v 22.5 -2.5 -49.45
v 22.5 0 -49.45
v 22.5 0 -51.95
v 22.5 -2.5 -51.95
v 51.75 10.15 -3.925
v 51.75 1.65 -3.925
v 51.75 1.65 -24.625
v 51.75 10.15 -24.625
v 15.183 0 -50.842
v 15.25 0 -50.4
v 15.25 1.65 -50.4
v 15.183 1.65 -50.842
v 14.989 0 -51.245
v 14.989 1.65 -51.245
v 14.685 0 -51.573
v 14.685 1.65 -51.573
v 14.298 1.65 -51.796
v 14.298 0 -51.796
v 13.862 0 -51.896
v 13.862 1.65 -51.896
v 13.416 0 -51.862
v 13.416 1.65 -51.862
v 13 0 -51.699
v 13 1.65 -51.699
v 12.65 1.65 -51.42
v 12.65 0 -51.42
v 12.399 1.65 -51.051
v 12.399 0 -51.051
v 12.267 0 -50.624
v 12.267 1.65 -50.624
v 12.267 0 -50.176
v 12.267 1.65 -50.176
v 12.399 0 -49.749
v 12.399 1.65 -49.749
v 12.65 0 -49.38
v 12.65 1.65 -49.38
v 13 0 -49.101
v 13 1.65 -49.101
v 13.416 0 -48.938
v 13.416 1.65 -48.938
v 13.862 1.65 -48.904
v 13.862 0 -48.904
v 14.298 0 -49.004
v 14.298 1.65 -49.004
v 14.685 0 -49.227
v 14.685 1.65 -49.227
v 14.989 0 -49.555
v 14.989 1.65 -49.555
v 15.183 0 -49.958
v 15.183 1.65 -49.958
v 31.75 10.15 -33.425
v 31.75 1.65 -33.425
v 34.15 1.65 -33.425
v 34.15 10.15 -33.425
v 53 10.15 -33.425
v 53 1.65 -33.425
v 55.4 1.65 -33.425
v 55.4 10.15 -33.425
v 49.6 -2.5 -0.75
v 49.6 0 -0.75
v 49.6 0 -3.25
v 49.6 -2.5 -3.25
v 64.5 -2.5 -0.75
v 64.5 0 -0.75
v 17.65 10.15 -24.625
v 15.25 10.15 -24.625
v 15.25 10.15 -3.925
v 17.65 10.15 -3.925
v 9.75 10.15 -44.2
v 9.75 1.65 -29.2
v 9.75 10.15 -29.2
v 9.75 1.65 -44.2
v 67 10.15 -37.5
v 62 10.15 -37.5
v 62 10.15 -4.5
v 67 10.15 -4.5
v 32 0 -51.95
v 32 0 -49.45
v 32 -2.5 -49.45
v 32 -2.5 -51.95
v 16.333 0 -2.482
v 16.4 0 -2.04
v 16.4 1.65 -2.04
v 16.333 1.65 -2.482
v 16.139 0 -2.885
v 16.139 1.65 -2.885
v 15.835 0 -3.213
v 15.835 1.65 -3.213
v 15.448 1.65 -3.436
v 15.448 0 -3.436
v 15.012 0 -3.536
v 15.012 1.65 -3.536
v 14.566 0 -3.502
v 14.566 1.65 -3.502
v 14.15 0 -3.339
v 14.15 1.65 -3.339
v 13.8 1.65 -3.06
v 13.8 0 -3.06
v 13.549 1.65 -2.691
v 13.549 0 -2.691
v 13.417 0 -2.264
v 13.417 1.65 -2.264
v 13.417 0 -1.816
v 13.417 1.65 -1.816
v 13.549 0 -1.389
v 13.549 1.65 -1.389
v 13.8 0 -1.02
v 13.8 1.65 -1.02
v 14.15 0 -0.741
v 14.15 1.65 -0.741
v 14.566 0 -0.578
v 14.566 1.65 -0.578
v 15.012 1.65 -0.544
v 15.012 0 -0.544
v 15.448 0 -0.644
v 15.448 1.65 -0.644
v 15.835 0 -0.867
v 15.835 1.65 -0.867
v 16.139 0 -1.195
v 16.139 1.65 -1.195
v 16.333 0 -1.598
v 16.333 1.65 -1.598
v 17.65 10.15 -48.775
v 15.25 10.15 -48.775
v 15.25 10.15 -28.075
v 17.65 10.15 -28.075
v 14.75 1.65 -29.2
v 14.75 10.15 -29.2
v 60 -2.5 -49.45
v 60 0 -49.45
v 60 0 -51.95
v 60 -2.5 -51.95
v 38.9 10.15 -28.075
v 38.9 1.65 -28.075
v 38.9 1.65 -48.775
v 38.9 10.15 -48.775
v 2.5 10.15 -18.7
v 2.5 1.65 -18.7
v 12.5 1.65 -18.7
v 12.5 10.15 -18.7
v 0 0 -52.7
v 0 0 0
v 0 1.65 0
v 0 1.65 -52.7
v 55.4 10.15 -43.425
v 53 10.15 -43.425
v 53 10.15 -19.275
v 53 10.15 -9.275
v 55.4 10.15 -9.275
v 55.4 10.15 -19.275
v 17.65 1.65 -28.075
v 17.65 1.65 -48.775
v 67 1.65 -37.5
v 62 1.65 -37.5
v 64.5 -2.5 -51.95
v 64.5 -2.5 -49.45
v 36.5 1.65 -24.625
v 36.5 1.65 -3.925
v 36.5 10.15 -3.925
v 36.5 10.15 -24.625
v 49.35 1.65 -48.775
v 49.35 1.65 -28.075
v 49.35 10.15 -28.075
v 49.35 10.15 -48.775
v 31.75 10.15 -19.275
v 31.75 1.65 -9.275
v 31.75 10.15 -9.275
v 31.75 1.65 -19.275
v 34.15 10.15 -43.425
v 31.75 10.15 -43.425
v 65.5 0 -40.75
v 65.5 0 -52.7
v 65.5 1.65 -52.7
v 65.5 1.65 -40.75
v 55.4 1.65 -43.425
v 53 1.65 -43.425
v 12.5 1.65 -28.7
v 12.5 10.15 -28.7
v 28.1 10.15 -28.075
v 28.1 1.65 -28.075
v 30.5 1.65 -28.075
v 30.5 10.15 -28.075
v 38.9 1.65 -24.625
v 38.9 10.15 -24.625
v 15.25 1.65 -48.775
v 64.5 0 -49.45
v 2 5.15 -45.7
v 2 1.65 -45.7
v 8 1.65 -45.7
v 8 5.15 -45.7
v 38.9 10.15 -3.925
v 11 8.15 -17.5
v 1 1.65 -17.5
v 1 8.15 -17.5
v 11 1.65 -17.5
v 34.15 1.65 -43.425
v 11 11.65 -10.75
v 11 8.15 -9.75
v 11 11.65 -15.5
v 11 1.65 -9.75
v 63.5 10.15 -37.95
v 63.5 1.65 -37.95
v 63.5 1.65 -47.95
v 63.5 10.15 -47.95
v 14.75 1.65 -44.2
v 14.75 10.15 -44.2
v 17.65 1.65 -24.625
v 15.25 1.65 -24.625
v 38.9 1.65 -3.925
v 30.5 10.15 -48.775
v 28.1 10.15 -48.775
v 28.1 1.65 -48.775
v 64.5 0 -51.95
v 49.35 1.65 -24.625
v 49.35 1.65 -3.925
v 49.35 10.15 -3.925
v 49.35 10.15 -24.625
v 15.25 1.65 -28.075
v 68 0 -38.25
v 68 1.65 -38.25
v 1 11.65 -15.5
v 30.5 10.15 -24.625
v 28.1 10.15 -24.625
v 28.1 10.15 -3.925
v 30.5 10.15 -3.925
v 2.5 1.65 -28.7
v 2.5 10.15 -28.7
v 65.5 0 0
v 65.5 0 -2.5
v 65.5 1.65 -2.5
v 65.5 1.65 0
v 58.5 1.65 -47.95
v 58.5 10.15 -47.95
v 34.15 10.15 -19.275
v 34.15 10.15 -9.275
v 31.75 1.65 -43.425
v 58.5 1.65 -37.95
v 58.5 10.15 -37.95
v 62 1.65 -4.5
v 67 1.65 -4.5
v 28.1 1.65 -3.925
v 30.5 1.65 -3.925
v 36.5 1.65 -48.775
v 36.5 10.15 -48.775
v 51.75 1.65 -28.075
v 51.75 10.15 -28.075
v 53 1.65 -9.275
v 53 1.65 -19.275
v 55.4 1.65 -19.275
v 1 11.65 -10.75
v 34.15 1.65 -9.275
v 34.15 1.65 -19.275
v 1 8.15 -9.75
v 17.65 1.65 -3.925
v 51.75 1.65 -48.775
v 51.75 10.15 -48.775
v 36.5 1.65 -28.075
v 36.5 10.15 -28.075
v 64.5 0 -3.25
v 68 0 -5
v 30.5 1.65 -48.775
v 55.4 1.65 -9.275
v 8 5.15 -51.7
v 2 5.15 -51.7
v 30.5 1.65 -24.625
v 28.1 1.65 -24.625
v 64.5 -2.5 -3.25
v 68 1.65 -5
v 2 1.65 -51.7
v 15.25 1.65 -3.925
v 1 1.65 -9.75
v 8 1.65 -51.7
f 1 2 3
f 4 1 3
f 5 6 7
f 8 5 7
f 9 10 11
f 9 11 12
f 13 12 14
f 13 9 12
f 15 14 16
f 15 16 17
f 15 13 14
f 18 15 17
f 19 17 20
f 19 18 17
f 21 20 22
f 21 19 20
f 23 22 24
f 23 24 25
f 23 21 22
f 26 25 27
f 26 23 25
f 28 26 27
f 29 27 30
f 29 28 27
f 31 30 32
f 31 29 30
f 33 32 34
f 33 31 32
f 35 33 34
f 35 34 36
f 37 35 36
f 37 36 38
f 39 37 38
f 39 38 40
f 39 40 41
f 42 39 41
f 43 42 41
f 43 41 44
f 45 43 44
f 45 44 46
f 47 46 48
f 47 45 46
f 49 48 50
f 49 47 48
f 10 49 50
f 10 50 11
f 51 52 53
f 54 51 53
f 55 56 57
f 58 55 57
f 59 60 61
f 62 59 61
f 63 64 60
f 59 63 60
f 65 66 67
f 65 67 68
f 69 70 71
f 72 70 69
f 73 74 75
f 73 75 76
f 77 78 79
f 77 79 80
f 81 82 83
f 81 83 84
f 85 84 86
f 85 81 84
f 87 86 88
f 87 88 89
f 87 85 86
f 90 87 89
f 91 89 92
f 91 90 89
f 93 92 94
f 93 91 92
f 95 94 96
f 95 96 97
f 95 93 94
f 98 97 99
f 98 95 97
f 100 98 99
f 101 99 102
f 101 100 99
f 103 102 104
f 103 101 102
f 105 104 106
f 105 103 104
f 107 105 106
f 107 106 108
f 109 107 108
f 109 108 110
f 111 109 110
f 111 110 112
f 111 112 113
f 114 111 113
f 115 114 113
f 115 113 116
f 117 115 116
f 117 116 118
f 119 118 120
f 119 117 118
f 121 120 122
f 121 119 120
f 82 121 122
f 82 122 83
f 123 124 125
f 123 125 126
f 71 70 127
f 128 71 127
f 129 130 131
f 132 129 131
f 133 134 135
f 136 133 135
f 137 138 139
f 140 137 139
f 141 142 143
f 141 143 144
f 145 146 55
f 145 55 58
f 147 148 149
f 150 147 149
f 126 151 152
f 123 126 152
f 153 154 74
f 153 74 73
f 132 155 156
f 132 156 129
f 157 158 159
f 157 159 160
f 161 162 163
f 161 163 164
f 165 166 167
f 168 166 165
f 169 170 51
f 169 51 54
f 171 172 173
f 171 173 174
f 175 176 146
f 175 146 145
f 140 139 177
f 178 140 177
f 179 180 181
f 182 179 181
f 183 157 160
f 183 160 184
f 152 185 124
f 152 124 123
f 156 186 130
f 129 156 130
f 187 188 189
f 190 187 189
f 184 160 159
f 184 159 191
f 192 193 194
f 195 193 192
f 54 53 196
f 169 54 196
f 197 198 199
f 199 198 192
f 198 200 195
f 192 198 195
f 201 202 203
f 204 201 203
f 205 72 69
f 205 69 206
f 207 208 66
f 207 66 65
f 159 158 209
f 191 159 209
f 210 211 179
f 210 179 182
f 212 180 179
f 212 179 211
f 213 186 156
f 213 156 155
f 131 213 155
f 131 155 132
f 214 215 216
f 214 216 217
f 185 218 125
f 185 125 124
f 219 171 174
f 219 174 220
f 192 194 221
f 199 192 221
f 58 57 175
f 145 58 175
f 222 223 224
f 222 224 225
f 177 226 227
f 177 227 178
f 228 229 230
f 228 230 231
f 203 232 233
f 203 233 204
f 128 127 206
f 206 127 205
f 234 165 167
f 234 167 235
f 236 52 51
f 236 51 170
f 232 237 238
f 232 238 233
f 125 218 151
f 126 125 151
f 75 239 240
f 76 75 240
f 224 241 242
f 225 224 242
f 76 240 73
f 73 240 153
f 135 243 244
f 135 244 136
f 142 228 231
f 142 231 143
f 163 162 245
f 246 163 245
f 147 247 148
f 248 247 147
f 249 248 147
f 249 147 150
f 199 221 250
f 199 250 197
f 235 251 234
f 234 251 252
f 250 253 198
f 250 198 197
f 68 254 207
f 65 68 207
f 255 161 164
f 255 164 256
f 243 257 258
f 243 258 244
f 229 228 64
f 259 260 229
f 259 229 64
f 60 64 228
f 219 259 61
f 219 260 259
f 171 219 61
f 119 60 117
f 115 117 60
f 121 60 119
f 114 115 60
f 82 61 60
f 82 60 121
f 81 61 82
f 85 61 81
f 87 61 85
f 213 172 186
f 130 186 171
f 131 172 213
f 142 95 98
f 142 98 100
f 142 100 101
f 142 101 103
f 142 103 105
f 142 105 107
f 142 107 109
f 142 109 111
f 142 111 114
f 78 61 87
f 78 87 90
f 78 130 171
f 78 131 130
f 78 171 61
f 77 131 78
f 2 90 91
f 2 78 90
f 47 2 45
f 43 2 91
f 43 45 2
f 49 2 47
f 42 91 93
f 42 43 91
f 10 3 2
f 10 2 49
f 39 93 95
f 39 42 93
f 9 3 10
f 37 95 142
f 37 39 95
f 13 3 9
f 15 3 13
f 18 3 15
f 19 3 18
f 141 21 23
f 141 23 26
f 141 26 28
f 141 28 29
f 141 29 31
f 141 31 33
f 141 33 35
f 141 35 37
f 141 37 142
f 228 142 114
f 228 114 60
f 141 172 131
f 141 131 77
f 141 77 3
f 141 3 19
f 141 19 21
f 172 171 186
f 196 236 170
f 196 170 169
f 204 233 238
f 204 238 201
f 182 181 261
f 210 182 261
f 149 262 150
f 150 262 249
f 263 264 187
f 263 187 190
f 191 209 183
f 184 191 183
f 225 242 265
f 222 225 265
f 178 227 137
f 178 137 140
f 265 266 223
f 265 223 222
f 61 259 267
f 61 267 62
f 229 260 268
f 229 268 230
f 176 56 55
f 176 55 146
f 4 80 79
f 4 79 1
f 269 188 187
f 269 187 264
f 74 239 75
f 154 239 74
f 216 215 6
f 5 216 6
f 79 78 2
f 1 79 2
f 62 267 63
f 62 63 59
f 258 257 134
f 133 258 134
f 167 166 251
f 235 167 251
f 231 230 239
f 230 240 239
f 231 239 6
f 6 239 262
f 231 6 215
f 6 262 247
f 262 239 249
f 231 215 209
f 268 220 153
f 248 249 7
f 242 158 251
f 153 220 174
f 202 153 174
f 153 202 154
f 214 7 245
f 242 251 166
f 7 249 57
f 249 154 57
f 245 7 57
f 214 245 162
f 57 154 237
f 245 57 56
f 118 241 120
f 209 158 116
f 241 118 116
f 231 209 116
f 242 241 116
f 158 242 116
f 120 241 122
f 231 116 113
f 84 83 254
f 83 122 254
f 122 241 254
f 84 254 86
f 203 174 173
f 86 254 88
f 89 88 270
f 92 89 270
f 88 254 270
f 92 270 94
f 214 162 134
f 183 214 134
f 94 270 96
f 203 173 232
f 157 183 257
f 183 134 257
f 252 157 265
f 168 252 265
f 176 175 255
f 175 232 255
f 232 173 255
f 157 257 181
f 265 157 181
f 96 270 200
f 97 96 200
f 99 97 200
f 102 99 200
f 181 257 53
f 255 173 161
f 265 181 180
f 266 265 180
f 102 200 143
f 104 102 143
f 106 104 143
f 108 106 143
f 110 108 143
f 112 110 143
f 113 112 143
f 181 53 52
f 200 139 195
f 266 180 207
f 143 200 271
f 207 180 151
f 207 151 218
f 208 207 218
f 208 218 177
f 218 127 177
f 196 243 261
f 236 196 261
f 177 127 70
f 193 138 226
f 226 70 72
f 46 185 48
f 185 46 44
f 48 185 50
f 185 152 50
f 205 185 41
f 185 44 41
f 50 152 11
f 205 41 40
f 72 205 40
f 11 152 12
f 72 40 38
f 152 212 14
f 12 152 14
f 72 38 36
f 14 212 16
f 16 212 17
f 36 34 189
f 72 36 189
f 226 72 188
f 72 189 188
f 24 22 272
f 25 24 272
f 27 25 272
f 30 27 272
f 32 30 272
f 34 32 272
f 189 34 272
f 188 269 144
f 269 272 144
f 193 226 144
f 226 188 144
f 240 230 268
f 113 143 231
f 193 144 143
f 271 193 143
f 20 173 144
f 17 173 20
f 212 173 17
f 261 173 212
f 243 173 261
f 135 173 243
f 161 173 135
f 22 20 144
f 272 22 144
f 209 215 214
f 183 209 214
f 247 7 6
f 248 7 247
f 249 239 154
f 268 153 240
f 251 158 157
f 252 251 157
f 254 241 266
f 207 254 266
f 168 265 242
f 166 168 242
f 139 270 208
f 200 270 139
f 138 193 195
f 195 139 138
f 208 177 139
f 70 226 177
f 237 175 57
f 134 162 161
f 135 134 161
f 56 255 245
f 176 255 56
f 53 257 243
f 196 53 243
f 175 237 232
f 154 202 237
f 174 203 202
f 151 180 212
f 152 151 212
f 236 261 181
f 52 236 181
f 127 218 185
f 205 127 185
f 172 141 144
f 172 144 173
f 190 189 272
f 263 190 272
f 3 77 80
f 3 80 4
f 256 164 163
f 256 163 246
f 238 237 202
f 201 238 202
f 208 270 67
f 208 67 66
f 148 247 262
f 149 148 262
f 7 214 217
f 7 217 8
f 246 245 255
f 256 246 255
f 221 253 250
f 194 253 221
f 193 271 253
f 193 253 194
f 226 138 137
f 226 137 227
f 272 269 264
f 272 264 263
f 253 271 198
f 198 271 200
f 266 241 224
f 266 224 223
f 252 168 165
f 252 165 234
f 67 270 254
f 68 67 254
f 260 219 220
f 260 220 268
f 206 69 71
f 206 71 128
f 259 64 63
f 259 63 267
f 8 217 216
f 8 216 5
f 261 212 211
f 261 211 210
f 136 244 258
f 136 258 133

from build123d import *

# Parameters (mm, degrees)
SKETCH1_R           = 1.5
BOSS_EXTRUDE1_DEPTH = 1.65
SKETCH2_W           = 14.9
SKETCH2_H           = 2.5
SKETCH2_W_2         = 4.5
SKETCH2_W_3         = 9.5
BOSS_EXTRUDE2_DEPTH = 2.5
SKETCH3_W           = 5
SKETCH3_H           = 15
SKETCH3_W_2         = 10
SKETCH3_H_2         = 10
SKETCH3_W_3         = 2.4
SKETCH3_H_3         = 20.7
SKETCH3_H_4         = 33
BOSS_EXTRUDE3_DEPTH = 8.5
SKETCH4_W           = 10
SKETCH4_H           = 7.75
BOSS_EXTRUDE4_DEPTH = 10
CUT_EXTRUDE1_DEPTH  = 10
SKETCH6_W           = 6
SKETCH6_H           = 6
BOSS_EXTRUDE5_DEPTH = 3.5


with BuildPart() as part:
    # Sketch1 → Boss-Extrude1 (new body)
    with BuildSketch(Plane(origin=(0, 0, 0), x_dir=(1, 0, 0), z_dir=(0, 1, 0))):
        Polygon((68, 5), (65.5, 2.5), (65.5, 0), (0, 0), (0, 52.7), (65.5, 52.7), (65.5, 40.75), (68, 38.25), align=None)
        with Locations((13.75, 50.4)):
            Circle(SKETCH1_R, mode=Mode.SUBTRACT)
        with Locations((14.9, 2.04)):
            Circle(SKETCH1_R, mode=Mode.SUBTRACT)
    extrude(amount=BOSS_EXTRUDE1_DEPTH)

    # Sketch2 → Boss-Extrude2 (add)
    with BuildSketch(Plane(origin=(0, 0, 0), x_dir=(-1, 0, 0), z_dir=(0, -1, 0))):
        with Locations((-57.05, 2)):
            Rectangle(SKETCH2_W, SKETCH2_H)
        with Locations((-62.25, 50.7)):
            Rectangle(SKETCH2_W_2, SKETCH2_H)
        with Locations((-27.25, 50.7)):
            Rectangle(SKETCH2_W_3, SKETCH2_H)
    extrude(amount=BOSS_EXTRUDE2_DEPTH)

    # Sketch3 → Boss-Extrude3 (add)
    with BuildSketch(Plane(origin=(0, 1.65, 0), x_dir=(1, 0, 0), z_dir=(0, 1, 0))):
        with Locations((12.25, 36.7)):
            Rectangle(SKETCH3_W, SKETCH3_H)
        with Locations((7.5, 23.7)):
            Rectangle(SKETCH3_W_2, SKETCH3_H_2)
        with Locations((16.45, 14.275)):
            Rectangle(SKETCH3_W_3, SKETCH3_H_3)
        with Locations((29.3, 14.275)):
            Rectangle(SKETCH3_W_3, SKETCH3_H_3)
        with Locations((37.7, 14.275)):
            Rectangle(SKETCH3_W_3, SKETCH3_H_3)
        with Locations((50.55, 14.275)):
            Rectangle(SKETCH3_W_3, SKETCH3_H_3)
        with Locations((16.45, 38.425)):
            Rectangle(SKETCH3_W_3, SKETCH3_H_3)
        with Locations((29.3, 38.425)):
            Rectangle(SKETCH3_W_3, SKETCH3_H_3)
        with Locations((37.7, 38.425)):
            Rectangle(SKETCH3_W_3, SKETCH3_H_3)
        with Locations((50.55, 38.425)):
            Rectangle(SKETCH3_W_3, SKETCH3_H_3)
        with Locations((61, 42.95)):
            Rectangle(SKETCH3_W, SKETCH3_H_2)
        with Locations((64.5, 21)):
            Rectangle(SKETCH3_W, SKETCH3_H_4)
        with Locations((32.95, 14.275)):
            Rectangle(SKETCH3_W_3, SKETCH3_H_2)
        with Locations((32.95, 38.425)):
            Rectangle(SKETCH3_W_3, SKETCH3_H_2)
        with Locations((54.2, 38.425)):
            Rectangle(SKETCH3_W_3, SKETCH3_H_2)
        with Locations((54.2, 14.275)):
            Rectangle(SKETCH3_W_3, SKETCH3_H_2)
    extrude(amount=BOSS_EXTRUDE3_DEPTH)

    # Sketch4 → Boss-Extrude4 (add)
    with BuildSketch(Plane(origin=(0, 1.65, 0), x_dir=(1, 0, 0), z_dir=(0, 1, 0))):
        with Locations((6, 13.625)):
            Rectangle(SKETCH4_W, SKETCH4_H)
    extrude(amount=BOSS_EXTRUDE4_DEPTH)

    # Sketch5 → Cut-Extrude1 (cut)
    with BuildSketch(Plane.ZY.offset(-1)):
        Polygon((-17.5, 8.15), (-15.5, 11.65), (-17.5, 11.65), align=None)
        Polygon((-9.75, 11.65), (-9.75, 8.15), (-10.75, 11.65), align=None)
    extrude(amount=-CUT_EXTRUDE1_DEPTH, mode=Mode.SUBTRACT)

    # Sketch6 → Boss-Extrude5 (add)
    with BuildSketch(Plane(origin=(0, 1.65, 0), x_dir=(1, 0, 0), z_dir=(0, 1, 0))):
        with Locations((5, 48.7)):
            Rectangle(SKETCH6_W, SKETCH6_H)
    extrude(amount=BOSS_EXTRUDE5_DEPTH)


solid = part.part
